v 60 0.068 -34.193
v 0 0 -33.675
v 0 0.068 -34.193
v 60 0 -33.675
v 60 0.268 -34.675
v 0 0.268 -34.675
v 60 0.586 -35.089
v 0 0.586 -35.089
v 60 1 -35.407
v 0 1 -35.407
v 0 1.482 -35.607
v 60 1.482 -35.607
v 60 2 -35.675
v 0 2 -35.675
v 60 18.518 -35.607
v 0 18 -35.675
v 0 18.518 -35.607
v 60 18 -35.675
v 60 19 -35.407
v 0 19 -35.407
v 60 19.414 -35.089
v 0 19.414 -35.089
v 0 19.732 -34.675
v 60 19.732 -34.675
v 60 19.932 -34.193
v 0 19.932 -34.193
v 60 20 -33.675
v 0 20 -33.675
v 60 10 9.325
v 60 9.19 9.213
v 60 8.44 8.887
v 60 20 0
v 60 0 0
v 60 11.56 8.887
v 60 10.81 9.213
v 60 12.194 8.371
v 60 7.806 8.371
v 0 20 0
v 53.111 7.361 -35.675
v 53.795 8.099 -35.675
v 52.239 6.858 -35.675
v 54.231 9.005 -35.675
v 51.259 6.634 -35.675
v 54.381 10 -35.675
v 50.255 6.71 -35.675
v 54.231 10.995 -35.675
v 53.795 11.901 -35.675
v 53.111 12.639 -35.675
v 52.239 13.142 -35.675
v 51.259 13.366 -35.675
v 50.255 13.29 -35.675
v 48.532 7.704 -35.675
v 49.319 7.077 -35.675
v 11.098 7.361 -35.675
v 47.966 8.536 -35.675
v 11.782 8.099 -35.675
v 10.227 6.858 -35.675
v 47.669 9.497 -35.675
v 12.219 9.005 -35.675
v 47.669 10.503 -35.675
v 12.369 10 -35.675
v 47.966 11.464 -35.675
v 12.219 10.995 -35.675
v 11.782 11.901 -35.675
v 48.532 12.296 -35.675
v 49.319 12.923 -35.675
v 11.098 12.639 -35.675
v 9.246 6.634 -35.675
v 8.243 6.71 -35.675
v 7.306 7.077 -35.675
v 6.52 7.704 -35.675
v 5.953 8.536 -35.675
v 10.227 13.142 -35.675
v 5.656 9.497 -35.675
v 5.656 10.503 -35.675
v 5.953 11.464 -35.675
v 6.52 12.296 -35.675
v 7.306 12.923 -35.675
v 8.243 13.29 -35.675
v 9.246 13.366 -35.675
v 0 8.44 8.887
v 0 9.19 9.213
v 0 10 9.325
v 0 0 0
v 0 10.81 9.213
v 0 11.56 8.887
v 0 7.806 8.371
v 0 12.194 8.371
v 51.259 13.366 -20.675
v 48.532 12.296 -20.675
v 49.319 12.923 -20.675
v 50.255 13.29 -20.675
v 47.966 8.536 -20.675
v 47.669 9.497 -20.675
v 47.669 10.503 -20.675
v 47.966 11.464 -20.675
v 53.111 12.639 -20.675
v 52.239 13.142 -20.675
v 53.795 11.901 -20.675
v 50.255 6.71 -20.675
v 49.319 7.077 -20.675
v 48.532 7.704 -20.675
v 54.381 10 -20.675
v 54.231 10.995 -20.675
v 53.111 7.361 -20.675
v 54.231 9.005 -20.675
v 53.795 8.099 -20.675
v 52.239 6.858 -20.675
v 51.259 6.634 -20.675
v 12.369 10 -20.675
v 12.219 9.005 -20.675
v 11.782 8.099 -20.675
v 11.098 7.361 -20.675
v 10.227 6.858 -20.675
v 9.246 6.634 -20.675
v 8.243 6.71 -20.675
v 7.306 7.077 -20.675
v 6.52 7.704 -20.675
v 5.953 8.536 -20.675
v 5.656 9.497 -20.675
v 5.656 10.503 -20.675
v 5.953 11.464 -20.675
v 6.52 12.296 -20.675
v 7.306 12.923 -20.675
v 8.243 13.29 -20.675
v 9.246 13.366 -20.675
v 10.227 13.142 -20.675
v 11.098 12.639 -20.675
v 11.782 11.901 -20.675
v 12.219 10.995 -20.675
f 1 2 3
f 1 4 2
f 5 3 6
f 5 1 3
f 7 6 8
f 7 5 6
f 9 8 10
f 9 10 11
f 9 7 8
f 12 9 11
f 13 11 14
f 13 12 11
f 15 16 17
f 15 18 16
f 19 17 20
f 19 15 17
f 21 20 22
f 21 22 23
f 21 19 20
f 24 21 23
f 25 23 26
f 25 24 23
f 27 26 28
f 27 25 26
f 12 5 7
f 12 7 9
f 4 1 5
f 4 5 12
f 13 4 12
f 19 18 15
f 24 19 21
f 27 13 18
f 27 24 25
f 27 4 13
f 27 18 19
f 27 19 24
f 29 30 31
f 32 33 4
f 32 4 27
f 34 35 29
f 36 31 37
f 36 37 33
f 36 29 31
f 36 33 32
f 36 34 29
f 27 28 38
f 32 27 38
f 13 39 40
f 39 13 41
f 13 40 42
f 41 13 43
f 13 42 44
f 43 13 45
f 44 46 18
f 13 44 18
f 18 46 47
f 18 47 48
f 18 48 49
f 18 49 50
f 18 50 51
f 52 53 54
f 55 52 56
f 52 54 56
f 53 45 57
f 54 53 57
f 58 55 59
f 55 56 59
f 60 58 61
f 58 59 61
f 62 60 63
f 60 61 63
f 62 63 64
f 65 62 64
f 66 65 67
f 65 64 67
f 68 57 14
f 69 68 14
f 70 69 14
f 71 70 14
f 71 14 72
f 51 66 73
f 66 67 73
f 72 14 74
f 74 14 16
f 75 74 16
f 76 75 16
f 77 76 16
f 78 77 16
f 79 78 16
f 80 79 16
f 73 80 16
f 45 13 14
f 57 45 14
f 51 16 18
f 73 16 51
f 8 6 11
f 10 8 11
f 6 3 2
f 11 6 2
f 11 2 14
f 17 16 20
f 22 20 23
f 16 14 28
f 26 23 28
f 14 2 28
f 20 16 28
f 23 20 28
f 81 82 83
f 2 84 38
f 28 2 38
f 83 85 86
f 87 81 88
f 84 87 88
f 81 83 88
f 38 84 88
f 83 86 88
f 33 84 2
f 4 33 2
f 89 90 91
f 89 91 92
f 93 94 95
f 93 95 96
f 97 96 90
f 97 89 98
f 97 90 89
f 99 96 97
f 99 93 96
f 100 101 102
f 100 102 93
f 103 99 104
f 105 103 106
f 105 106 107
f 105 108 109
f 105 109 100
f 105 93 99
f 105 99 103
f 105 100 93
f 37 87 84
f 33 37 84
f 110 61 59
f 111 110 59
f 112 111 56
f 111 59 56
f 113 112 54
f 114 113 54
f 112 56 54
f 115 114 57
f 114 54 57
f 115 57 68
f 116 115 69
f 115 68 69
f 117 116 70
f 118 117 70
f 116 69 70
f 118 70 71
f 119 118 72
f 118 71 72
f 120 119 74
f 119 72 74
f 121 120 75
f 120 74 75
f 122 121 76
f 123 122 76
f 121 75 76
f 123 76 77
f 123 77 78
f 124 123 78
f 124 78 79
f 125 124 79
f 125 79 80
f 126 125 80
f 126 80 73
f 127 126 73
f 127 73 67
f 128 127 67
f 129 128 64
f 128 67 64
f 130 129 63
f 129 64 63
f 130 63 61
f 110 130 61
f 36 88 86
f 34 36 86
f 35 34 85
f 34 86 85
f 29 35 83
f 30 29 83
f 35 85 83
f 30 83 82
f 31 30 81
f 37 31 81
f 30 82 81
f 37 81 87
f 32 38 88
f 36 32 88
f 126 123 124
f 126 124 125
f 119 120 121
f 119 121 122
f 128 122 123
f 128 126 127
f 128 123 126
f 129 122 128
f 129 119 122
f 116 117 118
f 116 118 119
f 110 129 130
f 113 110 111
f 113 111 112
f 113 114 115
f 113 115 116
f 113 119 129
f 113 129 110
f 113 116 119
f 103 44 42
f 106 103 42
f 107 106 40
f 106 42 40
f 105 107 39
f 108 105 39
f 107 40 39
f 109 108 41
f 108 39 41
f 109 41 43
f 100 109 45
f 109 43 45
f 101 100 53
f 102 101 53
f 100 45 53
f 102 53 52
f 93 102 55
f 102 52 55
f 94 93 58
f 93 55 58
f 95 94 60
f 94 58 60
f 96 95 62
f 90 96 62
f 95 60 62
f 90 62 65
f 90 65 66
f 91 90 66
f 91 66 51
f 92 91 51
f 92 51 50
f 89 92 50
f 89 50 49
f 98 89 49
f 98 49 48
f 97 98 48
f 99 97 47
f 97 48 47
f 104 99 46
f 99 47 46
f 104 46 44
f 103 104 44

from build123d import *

# Parameters (mm, degrees)
F1_DEPTH = 60
F2_R     = 3.375
F3_DEPTH = 15
F4_R     = 2


with BuildPart() as f1:
    # F0 (on Right) → F1 (new body)
    with BuildSketch(Plane.YZ):
        with BuildLine():
            Line((0, 0), (0, -35.67515))
            Line((0, -35.67515), (20, -35.67515))
            Line((20, -35.67515), (20, 0))
            Line((20, 0), (12.194061, 8.370845))
            ThreePointArc((12.194061, 8.370845), (10, 9.32485), (7.805939, 8.370845))
            Line((7.805939, 8.370845), (0, 0))
        make_face()
    extrude(amount=F1_DEPTH)

    # F2 (on face) → F3 (cut)
    with BuildSketch(Plane(origin=(0, 0, -35.67515), x_dir=(1, 0, 0), z_dir=(0, 0, -1))):
        with Locations((8.993604, -10)):
            Circle(F2_R)
        with Locations((51.006395, -10)):
            Circle(F2_R)
    extrude(amount=-F3_DEPTH, mode=Mode.SUBTRACT)

    # F4
    f4_edges = [f1.edges().sort_by_distance(p)[0] for p in [
        (30, 20, -35.67515),
        (30, 0, -35.67515),
    ]]
    fillet(f4_edges, radius=F4_R)


solid = f1.part
